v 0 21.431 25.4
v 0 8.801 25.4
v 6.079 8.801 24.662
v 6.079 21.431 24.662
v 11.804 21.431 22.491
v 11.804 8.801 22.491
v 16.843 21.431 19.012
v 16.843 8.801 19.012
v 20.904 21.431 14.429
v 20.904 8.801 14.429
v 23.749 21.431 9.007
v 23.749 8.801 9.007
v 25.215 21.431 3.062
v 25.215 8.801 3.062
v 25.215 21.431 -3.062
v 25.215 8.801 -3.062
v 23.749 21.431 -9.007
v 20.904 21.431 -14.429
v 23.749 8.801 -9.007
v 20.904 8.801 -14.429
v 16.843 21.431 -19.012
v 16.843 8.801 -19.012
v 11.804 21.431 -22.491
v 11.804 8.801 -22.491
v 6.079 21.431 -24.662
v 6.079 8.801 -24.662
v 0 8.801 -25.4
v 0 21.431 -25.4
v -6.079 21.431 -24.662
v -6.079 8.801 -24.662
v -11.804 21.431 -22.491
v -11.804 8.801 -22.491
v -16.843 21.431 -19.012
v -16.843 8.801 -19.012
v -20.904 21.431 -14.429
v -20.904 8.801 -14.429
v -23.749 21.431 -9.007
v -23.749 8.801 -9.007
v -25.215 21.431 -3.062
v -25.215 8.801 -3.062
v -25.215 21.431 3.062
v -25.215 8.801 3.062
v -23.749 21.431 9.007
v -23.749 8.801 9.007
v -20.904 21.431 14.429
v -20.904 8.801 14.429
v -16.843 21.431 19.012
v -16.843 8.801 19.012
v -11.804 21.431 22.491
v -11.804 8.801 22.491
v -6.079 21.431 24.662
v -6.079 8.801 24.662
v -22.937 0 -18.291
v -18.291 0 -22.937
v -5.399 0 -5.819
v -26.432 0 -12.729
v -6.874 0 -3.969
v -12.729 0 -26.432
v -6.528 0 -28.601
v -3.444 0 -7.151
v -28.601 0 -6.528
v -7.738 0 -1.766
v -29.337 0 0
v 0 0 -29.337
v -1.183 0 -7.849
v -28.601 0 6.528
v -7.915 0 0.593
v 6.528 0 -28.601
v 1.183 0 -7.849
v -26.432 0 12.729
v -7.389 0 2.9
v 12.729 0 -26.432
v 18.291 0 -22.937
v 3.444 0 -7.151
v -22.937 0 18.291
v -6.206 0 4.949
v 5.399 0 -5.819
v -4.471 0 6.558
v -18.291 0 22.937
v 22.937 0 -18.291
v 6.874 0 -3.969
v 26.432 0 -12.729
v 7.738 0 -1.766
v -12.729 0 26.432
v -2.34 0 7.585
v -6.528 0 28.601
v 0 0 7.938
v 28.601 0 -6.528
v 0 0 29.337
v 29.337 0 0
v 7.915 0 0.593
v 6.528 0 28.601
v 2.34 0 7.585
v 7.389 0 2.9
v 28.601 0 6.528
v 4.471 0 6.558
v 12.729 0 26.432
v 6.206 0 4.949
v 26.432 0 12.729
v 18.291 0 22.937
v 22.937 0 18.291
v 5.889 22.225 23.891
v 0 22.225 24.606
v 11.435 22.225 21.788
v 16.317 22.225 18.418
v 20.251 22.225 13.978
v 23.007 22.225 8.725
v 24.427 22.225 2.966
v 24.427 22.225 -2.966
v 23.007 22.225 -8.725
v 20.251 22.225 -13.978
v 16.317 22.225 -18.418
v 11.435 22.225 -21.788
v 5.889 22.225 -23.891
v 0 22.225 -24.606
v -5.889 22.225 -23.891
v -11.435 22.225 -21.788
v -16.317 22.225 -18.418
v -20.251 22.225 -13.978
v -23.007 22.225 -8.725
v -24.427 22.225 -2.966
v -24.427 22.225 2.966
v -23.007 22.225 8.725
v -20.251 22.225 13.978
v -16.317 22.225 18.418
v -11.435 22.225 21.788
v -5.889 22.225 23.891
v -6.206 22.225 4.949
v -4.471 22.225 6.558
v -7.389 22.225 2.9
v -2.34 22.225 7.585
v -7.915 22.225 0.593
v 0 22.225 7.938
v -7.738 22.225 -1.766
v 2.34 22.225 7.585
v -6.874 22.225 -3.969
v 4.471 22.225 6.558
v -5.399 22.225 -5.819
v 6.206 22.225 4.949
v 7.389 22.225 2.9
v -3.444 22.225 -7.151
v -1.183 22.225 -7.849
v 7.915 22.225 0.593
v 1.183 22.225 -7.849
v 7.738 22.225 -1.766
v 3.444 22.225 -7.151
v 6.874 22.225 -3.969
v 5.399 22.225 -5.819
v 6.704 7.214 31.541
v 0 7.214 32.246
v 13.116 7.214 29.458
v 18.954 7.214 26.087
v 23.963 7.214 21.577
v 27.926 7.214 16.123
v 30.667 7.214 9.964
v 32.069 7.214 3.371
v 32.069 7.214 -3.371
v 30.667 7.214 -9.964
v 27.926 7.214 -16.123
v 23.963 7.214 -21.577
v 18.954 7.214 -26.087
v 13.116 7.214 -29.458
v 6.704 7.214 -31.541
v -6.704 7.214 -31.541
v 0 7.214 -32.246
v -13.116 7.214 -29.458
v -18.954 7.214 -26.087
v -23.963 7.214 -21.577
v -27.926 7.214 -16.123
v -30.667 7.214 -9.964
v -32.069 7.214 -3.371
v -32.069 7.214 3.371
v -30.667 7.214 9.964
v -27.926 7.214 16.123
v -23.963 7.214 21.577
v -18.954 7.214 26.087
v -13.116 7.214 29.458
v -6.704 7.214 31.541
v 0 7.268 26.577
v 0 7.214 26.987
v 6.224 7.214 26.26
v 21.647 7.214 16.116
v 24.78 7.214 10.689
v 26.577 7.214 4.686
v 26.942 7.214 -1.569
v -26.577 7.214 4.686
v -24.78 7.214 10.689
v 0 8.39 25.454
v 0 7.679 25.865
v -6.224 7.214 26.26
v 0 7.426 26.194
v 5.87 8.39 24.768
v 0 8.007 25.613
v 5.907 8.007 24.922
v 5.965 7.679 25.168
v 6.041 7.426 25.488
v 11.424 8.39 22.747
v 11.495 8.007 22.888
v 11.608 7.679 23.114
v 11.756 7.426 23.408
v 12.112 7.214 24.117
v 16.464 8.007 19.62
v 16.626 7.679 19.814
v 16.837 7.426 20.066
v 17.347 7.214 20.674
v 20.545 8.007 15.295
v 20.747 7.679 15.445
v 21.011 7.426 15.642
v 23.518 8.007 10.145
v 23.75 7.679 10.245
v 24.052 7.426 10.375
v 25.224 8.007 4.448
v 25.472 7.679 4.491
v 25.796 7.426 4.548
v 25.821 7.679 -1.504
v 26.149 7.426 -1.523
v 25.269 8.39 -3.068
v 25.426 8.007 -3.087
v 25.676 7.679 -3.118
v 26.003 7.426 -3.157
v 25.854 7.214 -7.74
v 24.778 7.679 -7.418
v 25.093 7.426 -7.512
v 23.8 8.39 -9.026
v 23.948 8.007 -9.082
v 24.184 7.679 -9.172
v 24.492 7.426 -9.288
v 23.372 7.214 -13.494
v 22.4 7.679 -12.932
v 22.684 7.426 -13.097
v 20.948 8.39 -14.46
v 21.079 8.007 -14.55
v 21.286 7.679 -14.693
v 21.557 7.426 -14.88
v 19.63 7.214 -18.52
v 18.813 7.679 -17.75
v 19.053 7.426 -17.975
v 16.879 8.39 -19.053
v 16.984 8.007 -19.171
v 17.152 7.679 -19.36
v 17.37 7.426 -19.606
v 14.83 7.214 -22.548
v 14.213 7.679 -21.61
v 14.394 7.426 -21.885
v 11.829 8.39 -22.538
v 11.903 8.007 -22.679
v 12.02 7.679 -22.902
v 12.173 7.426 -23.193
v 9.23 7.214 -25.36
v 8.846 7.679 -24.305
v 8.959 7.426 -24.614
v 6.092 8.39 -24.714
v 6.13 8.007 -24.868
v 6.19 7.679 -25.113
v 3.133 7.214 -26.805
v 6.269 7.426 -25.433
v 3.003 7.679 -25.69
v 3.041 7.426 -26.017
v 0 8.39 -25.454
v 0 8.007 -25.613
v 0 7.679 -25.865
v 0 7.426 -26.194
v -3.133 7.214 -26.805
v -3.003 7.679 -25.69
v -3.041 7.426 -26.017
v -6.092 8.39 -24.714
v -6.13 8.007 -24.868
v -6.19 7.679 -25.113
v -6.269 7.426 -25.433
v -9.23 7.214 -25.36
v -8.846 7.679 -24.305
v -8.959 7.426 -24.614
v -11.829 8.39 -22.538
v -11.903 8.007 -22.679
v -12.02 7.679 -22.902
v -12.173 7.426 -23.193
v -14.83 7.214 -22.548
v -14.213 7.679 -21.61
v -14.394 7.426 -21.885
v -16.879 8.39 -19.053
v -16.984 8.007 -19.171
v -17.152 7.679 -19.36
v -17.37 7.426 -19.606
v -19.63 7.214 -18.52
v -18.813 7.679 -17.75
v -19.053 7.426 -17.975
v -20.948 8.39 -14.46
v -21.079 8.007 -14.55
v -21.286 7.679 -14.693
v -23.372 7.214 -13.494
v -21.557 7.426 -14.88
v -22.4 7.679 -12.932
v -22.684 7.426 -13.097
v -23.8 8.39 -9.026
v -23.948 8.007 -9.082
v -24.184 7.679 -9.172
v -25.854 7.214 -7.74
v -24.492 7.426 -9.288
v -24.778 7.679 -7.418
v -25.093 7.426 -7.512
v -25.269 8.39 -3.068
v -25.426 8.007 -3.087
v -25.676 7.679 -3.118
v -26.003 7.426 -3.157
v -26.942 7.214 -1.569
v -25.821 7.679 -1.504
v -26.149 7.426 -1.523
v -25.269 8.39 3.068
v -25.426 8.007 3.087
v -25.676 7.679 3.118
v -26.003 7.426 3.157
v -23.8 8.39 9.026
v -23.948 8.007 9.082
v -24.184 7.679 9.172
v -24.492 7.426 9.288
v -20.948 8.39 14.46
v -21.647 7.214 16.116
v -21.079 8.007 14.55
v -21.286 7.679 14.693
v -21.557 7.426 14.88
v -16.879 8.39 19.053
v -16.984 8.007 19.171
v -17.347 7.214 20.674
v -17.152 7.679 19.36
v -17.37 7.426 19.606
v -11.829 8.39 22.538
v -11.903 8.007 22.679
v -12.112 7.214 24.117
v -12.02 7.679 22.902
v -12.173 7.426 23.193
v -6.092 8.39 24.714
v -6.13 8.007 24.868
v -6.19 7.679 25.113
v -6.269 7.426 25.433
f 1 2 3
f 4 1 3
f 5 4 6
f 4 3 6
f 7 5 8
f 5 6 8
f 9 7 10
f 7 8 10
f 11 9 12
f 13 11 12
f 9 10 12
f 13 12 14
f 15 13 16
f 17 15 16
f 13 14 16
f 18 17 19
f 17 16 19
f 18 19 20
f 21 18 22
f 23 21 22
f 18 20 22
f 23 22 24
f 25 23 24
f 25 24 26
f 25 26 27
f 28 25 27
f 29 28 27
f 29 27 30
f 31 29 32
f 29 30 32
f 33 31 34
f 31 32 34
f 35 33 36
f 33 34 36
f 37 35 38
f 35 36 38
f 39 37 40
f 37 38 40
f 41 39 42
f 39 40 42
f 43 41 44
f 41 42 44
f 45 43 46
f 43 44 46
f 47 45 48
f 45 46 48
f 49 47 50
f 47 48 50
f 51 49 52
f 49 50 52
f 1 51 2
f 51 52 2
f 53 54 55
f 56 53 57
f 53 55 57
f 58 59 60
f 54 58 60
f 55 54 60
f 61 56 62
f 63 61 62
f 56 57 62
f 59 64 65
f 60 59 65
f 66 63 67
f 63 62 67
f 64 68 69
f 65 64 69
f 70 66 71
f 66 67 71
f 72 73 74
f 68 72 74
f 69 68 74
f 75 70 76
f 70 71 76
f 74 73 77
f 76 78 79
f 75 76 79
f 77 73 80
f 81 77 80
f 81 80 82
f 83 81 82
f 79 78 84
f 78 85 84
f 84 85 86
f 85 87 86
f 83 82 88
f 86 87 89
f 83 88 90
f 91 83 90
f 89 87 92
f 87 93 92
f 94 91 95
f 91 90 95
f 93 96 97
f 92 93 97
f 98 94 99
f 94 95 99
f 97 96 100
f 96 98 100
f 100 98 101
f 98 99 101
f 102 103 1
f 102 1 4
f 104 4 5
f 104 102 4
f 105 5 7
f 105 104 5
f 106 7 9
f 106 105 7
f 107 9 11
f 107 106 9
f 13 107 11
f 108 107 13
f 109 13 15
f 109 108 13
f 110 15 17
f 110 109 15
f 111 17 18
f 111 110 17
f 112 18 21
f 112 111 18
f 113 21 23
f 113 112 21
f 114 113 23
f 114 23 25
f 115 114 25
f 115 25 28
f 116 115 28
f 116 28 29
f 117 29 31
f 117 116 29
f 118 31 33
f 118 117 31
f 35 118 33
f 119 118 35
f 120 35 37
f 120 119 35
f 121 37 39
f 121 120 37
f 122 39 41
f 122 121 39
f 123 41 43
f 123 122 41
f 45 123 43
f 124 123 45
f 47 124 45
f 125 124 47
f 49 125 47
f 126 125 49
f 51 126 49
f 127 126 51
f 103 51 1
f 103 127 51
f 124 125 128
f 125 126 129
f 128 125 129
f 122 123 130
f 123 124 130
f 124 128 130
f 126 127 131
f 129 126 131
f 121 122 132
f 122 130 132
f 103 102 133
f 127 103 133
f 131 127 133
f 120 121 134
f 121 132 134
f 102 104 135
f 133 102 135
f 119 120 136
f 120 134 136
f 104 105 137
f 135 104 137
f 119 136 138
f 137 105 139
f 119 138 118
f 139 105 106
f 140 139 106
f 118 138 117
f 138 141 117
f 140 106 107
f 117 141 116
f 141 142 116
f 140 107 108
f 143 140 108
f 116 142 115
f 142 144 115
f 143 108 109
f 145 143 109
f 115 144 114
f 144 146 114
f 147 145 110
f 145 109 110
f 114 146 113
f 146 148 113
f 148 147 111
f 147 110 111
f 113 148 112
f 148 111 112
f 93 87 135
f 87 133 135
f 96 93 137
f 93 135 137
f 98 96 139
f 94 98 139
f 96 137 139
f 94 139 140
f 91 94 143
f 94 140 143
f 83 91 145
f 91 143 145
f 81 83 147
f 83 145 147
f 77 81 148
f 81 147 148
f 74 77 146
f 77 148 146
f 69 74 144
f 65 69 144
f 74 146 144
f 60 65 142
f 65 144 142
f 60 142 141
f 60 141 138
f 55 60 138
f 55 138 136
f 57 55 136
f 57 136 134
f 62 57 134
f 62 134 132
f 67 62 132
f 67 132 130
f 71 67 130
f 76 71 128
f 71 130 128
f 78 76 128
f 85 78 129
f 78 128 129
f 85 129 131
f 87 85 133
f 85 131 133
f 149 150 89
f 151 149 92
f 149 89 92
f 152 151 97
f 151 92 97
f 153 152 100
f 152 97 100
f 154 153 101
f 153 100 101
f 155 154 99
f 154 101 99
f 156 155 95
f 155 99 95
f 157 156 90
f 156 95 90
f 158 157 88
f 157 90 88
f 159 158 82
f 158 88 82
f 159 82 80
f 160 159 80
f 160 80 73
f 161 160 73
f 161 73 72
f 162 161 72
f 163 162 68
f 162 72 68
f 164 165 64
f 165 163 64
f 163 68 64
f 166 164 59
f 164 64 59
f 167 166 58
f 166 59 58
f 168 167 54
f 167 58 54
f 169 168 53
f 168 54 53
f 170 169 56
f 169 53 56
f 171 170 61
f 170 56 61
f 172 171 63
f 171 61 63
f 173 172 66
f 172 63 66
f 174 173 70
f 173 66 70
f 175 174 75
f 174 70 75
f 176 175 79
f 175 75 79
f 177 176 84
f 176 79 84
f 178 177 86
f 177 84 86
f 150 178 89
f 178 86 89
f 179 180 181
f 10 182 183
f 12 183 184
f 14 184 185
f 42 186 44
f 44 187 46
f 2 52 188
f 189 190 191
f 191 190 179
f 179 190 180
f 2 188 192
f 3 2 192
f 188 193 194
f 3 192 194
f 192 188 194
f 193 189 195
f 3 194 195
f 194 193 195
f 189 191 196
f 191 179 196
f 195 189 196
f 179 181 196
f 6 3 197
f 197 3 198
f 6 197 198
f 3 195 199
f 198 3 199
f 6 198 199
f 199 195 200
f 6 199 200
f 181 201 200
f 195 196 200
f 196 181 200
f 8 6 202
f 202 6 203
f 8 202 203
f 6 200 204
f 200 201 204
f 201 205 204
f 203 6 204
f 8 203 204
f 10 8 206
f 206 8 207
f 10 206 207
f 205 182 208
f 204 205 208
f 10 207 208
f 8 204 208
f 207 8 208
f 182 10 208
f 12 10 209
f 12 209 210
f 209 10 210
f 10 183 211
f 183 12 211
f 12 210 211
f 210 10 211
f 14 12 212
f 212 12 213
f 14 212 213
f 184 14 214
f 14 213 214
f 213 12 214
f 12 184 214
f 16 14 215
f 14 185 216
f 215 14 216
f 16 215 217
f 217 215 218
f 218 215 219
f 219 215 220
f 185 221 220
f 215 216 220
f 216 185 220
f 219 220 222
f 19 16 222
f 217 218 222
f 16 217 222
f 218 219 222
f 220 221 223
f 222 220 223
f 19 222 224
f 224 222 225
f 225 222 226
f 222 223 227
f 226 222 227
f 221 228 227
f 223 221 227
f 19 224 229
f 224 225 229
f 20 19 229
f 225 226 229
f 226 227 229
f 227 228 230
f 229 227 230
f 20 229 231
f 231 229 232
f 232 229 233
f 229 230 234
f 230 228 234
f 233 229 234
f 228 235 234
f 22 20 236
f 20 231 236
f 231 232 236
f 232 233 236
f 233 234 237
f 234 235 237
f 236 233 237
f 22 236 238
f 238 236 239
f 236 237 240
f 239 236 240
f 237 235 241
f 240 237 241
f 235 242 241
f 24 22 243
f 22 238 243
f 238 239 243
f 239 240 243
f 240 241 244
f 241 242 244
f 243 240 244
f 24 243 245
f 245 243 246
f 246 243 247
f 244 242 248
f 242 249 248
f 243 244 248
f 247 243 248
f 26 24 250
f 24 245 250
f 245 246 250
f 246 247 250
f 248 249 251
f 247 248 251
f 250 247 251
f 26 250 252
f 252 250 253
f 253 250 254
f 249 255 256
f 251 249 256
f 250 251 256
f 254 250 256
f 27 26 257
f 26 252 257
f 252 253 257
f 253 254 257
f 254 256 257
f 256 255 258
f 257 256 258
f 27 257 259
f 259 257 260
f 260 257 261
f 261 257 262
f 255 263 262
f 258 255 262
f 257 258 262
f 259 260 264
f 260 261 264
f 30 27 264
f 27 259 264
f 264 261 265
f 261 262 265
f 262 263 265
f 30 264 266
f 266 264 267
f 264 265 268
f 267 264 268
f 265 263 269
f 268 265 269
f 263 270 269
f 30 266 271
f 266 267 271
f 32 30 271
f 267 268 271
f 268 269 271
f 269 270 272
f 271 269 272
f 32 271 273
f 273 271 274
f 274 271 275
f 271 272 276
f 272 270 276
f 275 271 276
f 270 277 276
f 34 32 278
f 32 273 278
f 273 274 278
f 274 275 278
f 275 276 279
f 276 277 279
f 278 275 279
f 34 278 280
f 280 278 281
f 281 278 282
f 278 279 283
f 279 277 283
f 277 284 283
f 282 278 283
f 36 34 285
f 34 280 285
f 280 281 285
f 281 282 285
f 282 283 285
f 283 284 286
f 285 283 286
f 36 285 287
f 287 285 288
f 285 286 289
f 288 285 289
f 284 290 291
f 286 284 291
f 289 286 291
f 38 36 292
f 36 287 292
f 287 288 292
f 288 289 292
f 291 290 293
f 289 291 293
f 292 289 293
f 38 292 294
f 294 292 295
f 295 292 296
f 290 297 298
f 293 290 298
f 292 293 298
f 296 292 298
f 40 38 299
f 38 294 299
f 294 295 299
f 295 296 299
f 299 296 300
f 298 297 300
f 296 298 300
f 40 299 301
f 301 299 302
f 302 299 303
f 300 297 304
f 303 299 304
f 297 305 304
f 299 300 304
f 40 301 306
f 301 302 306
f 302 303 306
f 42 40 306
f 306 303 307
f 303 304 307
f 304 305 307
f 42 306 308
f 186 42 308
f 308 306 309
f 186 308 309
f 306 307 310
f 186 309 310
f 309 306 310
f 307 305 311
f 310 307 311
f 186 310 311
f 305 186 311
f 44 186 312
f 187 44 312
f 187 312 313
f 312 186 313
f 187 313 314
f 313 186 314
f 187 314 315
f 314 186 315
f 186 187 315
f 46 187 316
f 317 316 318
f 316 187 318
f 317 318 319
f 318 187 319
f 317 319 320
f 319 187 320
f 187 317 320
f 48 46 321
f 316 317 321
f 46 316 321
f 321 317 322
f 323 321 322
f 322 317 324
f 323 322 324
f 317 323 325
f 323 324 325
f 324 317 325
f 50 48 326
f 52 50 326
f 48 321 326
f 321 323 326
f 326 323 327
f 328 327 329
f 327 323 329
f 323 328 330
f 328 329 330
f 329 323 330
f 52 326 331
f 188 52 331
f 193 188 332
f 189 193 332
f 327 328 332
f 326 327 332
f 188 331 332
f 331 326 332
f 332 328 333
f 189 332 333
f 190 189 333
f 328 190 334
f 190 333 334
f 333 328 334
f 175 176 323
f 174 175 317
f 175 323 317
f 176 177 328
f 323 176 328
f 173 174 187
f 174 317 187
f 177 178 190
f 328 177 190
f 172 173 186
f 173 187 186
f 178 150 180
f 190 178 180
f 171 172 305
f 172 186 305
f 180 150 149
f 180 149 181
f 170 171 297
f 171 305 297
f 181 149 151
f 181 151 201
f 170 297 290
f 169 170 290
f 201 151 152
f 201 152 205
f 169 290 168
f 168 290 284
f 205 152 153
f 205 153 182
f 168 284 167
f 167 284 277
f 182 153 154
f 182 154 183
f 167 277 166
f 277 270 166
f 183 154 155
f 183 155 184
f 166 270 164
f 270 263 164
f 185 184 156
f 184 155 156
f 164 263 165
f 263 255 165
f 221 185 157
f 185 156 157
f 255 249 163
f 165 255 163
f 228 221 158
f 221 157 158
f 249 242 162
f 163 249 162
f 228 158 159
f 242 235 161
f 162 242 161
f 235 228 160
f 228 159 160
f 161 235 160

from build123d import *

# Parameters (mm, degrees)
F0_W    = 15.0114
F0_H    = 17.4625
F0_W_2  = 7.2136
F0_H_2  = 10.287
F2_R    = 1.5875
F3_SIZE = 0.79375


# Not quite as in the source:
# - a fillet or chamfer that OpenCascade refuses, or shapes differently, is made with other operations: its cross-section is extruded or revolved along the edge and cut away or added


with BuildPart() as f1:
    # F0 (on Right) → F1 (revolve)
    with BuildSketch(Plane.YZ):
        with Locations((14.7193, 16.66875)):
            Rectangle(F0_W, F0_H)
        with Locations((3.6068, 16.66875)):
            Rectangle(F0_W_2, F0_H)
        with Locations((3.6068, 30.5435)):
            Rectangle(F0_W_2, F0_H_2)
    revolve(axis=Axis((0, 11.1125, 0), (0, 1, 0)))

    # F2
    f2_edges = [f1.edges().sort_by_distance(p)[0] for p in [
        (0, 7.2136, -25.4),
    ]]
    fillet(f2_edges, radius=F2_R)

    # F3
    f3_edges = [f1.edges().sort_by_distance(p)[0] for p in [
        (0, 22.225, -25.4),
    ]]
    chamfer(f3_edges, length=F3_SIZE)

    # F4: chamfer of 6.35 x 15.748 on 2 edges, made by hand

    # F4_s1 → F4_t2 (revolve, cut)
    with BuildSketch(Plane.YZ):
        Polygon((15.748, 35.687), (0, 29.337), (0, 35.687), align=None)
    revolve(axis=Axis((0, 0, 0), (0, 1, 0)), mode=Mode.SUBTRACT)


solid = f1.part
